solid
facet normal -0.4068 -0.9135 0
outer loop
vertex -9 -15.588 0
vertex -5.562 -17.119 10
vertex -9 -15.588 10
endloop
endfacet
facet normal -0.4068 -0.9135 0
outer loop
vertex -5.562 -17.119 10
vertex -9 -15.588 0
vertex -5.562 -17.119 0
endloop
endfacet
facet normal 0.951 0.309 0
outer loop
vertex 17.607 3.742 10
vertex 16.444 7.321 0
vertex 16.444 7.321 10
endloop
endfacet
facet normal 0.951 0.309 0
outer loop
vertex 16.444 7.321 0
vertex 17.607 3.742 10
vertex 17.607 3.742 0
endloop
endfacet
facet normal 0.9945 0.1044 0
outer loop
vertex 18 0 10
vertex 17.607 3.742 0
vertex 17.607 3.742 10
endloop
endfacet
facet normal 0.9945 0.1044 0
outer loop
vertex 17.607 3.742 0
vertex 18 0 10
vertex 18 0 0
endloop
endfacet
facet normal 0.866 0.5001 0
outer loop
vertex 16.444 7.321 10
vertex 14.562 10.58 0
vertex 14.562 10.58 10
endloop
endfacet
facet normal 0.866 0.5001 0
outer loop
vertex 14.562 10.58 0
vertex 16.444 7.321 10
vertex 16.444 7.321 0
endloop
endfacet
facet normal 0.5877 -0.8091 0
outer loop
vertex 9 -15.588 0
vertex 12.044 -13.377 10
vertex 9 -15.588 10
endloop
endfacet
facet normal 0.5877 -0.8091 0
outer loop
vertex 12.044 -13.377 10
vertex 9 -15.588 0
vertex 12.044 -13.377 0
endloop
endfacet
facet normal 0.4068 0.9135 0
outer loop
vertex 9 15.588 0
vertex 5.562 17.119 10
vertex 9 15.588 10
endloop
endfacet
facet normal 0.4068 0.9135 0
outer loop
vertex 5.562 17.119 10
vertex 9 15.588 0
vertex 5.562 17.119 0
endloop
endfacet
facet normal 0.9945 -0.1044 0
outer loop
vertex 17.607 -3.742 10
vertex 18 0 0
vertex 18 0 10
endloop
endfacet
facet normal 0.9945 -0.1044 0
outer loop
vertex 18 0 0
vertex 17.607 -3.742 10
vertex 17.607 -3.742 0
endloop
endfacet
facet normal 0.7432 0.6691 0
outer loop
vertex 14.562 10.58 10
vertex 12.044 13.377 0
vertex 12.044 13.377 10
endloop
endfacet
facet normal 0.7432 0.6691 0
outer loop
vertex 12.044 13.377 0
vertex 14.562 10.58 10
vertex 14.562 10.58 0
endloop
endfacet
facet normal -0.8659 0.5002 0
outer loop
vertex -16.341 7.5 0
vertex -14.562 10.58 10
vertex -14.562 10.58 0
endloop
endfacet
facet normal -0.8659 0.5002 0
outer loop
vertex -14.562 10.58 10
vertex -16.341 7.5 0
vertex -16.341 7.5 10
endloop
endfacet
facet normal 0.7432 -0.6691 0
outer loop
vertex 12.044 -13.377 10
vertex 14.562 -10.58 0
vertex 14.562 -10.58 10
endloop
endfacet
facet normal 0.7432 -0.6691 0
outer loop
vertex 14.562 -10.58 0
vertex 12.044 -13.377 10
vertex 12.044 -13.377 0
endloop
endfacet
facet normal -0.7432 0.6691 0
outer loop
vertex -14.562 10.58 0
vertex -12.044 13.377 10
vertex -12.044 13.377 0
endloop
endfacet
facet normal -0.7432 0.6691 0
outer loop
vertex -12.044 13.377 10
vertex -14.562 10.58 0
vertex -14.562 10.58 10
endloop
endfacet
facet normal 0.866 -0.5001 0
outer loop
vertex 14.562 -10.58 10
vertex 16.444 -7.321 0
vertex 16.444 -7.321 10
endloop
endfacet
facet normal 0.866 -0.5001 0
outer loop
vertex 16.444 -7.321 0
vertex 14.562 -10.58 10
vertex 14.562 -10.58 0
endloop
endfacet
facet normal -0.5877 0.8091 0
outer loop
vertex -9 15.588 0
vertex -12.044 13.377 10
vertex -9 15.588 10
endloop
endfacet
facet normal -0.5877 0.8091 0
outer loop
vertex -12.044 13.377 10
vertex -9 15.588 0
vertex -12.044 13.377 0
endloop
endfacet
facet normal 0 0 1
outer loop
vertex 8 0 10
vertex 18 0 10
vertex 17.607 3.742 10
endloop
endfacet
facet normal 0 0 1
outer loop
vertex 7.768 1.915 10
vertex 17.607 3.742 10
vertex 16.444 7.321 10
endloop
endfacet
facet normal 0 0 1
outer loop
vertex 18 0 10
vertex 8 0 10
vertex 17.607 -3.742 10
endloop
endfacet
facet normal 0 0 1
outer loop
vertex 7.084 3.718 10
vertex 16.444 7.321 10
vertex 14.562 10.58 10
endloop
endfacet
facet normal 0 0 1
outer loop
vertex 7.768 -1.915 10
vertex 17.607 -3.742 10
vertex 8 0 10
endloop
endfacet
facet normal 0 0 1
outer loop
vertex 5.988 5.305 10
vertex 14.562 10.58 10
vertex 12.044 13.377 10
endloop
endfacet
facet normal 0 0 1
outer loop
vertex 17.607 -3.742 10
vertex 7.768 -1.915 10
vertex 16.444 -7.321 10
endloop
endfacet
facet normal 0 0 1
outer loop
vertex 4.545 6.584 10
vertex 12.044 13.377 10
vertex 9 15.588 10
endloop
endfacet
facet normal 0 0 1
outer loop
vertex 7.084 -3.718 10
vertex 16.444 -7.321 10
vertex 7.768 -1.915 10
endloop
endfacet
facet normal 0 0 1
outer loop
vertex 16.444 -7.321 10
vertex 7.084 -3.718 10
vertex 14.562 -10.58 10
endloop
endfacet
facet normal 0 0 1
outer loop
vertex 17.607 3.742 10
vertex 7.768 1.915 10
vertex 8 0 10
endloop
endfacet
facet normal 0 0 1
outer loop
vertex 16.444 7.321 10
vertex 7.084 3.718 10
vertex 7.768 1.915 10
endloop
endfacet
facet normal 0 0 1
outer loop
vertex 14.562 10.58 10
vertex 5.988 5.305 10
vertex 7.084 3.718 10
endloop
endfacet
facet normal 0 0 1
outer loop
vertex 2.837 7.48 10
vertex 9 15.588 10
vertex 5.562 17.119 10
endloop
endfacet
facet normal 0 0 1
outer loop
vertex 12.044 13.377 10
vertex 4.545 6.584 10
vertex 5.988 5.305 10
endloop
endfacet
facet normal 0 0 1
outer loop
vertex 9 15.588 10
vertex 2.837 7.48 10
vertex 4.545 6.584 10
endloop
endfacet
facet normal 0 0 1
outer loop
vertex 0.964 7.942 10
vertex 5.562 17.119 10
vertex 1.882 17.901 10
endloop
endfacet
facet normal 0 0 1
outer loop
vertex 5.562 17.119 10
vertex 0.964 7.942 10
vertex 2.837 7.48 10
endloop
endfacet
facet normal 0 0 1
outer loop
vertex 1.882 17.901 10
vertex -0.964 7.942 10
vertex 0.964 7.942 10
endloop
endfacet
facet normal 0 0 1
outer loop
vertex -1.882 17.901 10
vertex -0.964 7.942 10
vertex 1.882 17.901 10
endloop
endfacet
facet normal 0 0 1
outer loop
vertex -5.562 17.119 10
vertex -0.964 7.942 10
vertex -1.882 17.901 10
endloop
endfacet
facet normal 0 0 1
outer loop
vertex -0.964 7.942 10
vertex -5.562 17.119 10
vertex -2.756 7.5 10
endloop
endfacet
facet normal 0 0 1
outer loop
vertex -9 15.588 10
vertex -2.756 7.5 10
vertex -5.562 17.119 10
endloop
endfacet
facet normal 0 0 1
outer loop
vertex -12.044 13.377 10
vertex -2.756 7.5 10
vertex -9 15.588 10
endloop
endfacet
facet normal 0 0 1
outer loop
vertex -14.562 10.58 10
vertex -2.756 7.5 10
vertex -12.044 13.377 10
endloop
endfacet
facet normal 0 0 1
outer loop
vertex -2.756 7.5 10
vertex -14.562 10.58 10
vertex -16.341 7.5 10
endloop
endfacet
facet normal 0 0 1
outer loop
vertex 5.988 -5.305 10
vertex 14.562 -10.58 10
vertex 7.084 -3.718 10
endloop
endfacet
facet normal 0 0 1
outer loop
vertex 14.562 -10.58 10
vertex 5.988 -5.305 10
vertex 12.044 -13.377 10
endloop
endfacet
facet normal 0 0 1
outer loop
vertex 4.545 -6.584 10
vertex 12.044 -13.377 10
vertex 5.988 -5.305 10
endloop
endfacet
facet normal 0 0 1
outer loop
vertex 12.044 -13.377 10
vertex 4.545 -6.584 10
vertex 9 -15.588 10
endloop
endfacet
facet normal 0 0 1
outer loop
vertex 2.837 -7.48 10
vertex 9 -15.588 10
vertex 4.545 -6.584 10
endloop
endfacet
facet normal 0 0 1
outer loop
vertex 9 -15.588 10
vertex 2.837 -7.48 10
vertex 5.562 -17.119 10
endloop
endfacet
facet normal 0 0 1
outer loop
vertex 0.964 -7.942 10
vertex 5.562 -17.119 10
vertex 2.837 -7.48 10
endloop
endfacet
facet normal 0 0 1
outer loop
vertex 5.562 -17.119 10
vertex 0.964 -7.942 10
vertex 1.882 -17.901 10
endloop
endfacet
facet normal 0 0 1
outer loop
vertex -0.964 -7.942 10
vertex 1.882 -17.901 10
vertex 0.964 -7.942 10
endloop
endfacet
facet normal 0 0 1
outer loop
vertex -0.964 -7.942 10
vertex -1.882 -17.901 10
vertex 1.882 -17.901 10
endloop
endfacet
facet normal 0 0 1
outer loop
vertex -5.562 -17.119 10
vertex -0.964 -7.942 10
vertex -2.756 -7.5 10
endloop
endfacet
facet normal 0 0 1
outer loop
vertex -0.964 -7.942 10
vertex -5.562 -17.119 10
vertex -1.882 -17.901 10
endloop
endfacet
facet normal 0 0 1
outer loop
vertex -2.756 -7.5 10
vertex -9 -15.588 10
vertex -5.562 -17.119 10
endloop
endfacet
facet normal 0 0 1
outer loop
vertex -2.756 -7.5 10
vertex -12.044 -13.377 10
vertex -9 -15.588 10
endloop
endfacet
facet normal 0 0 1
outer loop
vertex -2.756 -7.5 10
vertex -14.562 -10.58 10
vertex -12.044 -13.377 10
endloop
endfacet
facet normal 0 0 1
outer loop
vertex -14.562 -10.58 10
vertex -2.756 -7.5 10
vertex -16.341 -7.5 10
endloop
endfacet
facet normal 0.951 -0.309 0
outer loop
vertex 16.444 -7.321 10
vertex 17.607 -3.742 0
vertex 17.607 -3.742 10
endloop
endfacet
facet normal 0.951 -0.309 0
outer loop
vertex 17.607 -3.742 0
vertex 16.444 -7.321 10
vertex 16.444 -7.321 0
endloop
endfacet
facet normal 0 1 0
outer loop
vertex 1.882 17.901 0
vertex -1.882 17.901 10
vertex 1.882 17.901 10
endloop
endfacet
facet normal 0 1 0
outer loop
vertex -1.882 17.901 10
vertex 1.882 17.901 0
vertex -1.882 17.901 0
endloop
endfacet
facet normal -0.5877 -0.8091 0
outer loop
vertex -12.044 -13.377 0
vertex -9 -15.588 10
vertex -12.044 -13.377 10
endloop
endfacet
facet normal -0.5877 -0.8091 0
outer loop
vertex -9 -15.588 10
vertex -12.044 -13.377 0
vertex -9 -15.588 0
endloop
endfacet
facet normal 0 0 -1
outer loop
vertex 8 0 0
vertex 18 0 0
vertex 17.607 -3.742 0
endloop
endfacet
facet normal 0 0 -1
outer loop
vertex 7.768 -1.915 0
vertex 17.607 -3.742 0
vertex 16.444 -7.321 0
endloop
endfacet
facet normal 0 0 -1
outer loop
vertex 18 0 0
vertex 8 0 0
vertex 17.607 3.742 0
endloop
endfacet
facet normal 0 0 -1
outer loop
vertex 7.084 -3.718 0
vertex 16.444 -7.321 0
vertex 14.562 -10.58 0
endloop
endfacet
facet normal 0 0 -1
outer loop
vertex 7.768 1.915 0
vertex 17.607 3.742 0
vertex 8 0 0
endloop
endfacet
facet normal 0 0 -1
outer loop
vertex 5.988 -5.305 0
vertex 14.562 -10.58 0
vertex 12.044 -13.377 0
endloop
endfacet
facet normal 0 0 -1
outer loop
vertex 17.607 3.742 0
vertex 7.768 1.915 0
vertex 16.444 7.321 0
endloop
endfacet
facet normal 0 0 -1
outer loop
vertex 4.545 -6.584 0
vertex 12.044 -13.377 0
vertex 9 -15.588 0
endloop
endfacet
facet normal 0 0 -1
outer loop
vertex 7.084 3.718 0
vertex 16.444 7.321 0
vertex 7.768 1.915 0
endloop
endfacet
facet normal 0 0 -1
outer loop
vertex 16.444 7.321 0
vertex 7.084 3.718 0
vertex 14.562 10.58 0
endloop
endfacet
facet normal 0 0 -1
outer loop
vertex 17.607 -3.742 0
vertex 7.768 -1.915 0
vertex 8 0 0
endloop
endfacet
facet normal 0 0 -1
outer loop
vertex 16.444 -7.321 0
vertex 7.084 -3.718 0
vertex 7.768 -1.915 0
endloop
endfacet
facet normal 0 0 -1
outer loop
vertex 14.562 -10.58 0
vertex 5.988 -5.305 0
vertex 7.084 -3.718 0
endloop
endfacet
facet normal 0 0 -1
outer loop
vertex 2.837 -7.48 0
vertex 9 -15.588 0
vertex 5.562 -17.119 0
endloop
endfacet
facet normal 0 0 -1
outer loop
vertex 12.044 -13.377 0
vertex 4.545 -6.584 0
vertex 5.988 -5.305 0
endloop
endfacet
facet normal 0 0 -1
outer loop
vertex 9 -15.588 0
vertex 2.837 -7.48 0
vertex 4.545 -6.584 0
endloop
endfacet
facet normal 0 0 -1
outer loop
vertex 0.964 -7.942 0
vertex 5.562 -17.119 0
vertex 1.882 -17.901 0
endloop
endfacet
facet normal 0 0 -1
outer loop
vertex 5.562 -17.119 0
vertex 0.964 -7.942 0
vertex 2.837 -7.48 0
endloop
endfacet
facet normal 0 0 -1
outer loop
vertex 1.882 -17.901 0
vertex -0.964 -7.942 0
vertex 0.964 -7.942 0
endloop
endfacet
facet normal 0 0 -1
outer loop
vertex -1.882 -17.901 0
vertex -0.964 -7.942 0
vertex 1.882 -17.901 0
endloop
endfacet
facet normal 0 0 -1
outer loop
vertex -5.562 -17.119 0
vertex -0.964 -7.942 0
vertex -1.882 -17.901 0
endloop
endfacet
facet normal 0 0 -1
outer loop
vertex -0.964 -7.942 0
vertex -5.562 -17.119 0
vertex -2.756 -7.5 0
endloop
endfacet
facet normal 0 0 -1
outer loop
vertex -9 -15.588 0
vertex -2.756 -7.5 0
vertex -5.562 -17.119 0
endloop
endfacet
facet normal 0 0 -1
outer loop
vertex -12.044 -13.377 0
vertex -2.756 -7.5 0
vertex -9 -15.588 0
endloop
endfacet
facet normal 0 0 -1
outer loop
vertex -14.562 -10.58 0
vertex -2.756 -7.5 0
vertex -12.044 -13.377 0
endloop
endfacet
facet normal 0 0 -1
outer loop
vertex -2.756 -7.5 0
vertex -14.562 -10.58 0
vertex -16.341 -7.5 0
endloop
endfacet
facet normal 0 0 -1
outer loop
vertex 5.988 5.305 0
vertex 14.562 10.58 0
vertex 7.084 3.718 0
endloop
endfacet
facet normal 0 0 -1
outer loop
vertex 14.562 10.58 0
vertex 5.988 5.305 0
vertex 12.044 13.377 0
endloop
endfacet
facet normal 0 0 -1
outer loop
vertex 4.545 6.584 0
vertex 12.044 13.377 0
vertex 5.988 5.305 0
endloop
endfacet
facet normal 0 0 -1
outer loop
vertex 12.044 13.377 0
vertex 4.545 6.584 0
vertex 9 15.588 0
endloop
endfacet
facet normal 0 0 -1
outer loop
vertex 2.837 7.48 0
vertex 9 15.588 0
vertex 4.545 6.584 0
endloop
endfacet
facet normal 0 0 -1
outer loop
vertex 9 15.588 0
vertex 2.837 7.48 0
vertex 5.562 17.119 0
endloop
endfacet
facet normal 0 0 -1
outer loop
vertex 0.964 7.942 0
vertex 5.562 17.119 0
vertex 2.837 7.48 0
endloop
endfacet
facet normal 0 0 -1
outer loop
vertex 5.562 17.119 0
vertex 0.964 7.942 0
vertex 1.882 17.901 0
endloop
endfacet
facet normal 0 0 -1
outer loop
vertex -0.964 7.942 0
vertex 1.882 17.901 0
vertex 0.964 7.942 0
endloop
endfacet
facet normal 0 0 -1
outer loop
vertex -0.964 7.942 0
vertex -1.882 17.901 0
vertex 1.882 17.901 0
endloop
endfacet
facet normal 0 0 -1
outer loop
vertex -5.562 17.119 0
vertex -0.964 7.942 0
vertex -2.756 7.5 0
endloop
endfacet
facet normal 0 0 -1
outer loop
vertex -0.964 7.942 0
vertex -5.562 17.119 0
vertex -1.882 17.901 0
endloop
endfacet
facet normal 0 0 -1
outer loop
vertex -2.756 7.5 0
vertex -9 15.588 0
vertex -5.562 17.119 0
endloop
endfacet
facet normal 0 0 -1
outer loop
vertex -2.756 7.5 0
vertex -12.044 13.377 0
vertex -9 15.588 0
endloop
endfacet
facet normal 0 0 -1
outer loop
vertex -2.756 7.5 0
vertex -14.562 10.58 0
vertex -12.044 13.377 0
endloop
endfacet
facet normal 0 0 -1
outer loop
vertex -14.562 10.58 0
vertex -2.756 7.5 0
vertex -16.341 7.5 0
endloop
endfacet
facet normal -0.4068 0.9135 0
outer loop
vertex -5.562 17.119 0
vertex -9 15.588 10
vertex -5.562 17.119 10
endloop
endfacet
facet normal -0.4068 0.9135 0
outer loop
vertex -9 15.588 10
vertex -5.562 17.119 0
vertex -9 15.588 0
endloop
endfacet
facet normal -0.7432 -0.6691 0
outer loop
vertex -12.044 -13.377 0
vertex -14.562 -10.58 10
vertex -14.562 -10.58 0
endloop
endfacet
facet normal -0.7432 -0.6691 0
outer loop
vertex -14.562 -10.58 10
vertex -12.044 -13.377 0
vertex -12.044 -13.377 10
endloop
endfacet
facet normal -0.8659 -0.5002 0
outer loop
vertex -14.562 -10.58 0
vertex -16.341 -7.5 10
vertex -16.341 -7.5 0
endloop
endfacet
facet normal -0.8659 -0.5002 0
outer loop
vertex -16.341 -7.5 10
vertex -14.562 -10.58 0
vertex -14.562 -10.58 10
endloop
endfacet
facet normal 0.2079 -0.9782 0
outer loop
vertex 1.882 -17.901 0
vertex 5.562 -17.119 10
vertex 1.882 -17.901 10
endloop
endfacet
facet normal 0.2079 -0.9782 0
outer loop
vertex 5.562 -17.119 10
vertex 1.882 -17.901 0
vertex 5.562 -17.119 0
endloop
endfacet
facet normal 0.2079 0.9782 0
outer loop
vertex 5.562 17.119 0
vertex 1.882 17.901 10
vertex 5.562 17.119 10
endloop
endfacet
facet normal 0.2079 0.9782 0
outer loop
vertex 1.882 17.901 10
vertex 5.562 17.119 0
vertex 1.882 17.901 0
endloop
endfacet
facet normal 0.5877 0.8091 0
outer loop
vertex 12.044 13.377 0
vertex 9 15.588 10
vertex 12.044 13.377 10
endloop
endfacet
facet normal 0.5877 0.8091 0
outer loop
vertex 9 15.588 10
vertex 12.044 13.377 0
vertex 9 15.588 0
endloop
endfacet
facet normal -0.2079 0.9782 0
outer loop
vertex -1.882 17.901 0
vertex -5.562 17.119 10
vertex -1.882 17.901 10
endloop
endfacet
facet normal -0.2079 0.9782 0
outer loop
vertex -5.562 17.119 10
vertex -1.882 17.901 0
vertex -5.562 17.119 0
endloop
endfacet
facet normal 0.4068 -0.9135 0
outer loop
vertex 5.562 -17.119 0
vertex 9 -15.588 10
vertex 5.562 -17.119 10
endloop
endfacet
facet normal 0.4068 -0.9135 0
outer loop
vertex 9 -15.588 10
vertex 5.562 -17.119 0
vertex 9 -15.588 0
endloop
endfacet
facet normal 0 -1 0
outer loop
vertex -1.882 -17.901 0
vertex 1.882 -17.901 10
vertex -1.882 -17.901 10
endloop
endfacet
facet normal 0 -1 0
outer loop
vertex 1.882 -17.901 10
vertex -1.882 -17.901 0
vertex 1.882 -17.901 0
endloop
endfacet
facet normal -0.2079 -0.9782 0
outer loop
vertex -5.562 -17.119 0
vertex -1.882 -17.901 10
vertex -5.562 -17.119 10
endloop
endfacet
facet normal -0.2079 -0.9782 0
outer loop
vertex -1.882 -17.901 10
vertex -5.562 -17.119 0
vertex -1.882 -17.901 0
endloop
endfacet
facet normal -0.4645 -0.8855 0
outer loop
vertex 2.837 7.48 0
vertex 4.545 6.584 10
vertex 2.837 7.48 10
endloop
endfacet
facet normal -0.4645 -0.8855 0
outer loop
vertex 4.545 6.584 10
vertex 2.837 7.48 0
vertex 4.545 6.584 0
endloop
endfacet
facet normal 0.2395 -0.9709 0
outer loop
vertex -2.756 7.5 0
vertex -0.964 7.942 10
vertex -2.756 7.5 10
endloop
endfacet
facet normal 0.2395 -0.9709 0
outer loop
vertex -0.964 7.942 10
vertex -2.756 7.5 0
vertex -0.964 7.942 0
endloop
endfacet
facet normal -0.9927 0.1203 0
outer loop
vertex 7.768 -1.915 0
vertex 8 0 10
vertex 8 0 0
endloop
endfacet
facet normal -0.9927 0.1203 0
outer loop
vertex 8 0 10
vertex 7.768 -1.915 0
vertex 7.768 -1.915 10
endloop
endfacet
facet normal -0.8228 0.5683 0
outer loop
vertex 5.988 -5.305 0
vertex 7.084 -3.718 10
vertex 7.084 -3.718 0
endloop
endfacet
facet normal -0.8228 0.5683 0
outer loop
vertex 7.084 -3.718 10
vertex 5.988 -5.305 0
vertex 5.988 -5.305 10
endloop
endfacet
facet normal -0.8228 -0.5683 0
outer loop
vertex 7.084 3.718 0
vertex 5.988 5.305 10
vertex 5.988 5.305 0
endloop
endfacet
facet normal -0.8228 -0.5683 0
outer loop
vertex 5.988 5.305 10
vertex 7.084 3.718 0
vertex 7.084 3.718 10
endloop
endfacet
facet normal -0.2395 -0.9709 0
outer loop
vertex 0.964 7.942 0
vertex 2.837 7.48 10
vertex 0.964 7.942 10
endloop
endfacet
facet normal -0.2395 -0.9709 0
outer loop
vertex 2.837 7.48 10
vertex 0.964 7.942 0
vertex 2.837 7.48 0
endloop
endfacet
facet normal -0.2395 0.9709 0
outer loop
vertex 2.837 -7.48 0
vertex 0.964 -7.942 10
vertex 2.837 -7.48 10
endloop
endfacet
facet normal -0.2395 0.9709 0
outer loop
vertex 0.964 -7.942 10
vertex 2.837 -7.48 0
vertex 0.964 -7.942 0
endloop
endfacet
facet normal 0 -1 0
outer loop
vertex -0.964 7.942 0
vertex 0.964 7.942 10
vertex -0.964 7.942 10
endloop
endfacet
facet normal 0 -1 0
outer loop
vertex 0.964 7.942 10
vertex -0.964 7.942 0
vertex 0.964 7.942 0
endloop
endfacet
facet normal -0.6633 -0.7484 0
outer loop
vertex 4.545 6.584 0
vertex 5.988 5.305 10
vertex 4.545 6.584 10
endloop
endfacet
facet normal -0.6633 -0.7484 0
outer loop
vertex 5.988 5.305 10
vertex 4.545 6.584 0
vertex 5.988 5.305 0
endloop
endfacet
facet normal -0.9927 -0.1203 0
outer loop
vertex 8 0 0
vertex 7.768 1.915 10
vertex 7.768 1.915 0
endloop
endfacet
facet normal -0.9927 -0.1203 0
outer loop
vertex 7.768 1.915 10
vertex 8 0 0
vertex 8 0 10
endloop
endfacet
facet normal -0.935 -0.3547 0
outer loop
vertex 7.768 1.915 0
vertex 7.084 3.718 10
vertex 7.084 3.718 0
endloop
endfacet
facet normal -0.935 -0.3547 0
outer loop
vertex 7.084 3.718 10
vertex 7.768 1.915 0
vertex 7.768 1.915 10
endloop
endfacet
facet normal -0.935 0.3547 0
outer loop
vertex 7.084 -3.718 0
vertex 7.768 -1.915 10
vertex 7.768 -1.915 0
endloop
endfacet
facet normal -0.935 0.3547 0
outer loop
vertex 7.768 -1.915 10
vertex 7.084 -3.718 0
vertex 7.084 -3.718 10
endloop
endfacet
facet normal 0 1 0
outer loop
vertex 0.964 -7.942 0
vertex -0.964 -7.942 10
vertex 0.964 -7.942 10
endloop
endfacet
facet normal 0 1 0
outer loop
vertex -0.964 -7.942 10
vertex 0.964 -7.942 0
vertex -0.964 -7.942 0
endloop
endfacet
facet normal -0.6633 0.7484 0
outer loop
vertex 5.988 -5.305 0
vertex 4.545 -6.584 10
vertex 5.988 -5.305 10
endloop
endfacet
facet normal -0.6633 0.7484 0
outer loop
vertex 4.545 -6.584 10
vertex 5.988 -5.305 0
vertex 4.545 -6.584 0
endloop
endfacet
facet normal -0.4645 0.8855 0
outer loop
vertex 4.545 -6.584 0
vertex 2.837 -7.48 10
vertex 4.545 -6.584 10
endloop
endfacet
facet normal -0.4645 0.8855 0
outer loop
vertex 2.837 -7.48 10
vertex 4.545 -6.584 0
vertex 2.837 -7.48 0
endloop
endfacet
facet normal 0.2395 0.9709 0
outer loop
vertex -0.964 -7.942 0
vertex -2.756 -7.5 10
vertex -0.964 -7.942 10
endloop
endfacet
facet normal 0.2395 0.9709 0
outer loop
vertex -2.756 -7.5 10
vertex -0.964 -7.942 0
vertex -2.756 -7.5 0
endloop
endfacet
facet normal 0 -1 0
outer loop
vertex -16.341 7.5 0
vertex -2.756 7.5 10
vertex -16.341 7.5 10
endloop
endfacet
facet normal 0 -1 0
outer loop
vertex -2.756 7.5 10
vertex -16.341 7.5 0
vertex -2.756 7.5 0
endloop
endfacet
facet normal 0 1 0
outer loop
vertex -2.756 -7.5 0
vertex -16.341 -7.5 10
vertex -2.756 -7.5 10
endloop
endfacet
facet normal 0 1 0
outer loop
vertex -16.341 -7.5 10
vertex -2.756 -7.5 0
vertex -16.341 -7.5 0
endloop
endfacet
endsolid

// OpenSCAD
// Diameter of pipe [mm] *default of 16 fits 1/2"
innerDiameter=16;

// Outer diameter of tool [mm]
outerDiameter=36;

// Thickness of tool [mm]
thickness=10;

difference() {
	cylinder(h=thickness,r=outerDiameter/2);
	translate([0,0,-0.5])
	cylinder(h=thickness+1,r=innerDiameter/2);
	translate([-outerDiameter,-((innerDiameter-1)/2),-0.5])
	cube([outerDiameter,innerDiameter-1,thickness+1]);
}
